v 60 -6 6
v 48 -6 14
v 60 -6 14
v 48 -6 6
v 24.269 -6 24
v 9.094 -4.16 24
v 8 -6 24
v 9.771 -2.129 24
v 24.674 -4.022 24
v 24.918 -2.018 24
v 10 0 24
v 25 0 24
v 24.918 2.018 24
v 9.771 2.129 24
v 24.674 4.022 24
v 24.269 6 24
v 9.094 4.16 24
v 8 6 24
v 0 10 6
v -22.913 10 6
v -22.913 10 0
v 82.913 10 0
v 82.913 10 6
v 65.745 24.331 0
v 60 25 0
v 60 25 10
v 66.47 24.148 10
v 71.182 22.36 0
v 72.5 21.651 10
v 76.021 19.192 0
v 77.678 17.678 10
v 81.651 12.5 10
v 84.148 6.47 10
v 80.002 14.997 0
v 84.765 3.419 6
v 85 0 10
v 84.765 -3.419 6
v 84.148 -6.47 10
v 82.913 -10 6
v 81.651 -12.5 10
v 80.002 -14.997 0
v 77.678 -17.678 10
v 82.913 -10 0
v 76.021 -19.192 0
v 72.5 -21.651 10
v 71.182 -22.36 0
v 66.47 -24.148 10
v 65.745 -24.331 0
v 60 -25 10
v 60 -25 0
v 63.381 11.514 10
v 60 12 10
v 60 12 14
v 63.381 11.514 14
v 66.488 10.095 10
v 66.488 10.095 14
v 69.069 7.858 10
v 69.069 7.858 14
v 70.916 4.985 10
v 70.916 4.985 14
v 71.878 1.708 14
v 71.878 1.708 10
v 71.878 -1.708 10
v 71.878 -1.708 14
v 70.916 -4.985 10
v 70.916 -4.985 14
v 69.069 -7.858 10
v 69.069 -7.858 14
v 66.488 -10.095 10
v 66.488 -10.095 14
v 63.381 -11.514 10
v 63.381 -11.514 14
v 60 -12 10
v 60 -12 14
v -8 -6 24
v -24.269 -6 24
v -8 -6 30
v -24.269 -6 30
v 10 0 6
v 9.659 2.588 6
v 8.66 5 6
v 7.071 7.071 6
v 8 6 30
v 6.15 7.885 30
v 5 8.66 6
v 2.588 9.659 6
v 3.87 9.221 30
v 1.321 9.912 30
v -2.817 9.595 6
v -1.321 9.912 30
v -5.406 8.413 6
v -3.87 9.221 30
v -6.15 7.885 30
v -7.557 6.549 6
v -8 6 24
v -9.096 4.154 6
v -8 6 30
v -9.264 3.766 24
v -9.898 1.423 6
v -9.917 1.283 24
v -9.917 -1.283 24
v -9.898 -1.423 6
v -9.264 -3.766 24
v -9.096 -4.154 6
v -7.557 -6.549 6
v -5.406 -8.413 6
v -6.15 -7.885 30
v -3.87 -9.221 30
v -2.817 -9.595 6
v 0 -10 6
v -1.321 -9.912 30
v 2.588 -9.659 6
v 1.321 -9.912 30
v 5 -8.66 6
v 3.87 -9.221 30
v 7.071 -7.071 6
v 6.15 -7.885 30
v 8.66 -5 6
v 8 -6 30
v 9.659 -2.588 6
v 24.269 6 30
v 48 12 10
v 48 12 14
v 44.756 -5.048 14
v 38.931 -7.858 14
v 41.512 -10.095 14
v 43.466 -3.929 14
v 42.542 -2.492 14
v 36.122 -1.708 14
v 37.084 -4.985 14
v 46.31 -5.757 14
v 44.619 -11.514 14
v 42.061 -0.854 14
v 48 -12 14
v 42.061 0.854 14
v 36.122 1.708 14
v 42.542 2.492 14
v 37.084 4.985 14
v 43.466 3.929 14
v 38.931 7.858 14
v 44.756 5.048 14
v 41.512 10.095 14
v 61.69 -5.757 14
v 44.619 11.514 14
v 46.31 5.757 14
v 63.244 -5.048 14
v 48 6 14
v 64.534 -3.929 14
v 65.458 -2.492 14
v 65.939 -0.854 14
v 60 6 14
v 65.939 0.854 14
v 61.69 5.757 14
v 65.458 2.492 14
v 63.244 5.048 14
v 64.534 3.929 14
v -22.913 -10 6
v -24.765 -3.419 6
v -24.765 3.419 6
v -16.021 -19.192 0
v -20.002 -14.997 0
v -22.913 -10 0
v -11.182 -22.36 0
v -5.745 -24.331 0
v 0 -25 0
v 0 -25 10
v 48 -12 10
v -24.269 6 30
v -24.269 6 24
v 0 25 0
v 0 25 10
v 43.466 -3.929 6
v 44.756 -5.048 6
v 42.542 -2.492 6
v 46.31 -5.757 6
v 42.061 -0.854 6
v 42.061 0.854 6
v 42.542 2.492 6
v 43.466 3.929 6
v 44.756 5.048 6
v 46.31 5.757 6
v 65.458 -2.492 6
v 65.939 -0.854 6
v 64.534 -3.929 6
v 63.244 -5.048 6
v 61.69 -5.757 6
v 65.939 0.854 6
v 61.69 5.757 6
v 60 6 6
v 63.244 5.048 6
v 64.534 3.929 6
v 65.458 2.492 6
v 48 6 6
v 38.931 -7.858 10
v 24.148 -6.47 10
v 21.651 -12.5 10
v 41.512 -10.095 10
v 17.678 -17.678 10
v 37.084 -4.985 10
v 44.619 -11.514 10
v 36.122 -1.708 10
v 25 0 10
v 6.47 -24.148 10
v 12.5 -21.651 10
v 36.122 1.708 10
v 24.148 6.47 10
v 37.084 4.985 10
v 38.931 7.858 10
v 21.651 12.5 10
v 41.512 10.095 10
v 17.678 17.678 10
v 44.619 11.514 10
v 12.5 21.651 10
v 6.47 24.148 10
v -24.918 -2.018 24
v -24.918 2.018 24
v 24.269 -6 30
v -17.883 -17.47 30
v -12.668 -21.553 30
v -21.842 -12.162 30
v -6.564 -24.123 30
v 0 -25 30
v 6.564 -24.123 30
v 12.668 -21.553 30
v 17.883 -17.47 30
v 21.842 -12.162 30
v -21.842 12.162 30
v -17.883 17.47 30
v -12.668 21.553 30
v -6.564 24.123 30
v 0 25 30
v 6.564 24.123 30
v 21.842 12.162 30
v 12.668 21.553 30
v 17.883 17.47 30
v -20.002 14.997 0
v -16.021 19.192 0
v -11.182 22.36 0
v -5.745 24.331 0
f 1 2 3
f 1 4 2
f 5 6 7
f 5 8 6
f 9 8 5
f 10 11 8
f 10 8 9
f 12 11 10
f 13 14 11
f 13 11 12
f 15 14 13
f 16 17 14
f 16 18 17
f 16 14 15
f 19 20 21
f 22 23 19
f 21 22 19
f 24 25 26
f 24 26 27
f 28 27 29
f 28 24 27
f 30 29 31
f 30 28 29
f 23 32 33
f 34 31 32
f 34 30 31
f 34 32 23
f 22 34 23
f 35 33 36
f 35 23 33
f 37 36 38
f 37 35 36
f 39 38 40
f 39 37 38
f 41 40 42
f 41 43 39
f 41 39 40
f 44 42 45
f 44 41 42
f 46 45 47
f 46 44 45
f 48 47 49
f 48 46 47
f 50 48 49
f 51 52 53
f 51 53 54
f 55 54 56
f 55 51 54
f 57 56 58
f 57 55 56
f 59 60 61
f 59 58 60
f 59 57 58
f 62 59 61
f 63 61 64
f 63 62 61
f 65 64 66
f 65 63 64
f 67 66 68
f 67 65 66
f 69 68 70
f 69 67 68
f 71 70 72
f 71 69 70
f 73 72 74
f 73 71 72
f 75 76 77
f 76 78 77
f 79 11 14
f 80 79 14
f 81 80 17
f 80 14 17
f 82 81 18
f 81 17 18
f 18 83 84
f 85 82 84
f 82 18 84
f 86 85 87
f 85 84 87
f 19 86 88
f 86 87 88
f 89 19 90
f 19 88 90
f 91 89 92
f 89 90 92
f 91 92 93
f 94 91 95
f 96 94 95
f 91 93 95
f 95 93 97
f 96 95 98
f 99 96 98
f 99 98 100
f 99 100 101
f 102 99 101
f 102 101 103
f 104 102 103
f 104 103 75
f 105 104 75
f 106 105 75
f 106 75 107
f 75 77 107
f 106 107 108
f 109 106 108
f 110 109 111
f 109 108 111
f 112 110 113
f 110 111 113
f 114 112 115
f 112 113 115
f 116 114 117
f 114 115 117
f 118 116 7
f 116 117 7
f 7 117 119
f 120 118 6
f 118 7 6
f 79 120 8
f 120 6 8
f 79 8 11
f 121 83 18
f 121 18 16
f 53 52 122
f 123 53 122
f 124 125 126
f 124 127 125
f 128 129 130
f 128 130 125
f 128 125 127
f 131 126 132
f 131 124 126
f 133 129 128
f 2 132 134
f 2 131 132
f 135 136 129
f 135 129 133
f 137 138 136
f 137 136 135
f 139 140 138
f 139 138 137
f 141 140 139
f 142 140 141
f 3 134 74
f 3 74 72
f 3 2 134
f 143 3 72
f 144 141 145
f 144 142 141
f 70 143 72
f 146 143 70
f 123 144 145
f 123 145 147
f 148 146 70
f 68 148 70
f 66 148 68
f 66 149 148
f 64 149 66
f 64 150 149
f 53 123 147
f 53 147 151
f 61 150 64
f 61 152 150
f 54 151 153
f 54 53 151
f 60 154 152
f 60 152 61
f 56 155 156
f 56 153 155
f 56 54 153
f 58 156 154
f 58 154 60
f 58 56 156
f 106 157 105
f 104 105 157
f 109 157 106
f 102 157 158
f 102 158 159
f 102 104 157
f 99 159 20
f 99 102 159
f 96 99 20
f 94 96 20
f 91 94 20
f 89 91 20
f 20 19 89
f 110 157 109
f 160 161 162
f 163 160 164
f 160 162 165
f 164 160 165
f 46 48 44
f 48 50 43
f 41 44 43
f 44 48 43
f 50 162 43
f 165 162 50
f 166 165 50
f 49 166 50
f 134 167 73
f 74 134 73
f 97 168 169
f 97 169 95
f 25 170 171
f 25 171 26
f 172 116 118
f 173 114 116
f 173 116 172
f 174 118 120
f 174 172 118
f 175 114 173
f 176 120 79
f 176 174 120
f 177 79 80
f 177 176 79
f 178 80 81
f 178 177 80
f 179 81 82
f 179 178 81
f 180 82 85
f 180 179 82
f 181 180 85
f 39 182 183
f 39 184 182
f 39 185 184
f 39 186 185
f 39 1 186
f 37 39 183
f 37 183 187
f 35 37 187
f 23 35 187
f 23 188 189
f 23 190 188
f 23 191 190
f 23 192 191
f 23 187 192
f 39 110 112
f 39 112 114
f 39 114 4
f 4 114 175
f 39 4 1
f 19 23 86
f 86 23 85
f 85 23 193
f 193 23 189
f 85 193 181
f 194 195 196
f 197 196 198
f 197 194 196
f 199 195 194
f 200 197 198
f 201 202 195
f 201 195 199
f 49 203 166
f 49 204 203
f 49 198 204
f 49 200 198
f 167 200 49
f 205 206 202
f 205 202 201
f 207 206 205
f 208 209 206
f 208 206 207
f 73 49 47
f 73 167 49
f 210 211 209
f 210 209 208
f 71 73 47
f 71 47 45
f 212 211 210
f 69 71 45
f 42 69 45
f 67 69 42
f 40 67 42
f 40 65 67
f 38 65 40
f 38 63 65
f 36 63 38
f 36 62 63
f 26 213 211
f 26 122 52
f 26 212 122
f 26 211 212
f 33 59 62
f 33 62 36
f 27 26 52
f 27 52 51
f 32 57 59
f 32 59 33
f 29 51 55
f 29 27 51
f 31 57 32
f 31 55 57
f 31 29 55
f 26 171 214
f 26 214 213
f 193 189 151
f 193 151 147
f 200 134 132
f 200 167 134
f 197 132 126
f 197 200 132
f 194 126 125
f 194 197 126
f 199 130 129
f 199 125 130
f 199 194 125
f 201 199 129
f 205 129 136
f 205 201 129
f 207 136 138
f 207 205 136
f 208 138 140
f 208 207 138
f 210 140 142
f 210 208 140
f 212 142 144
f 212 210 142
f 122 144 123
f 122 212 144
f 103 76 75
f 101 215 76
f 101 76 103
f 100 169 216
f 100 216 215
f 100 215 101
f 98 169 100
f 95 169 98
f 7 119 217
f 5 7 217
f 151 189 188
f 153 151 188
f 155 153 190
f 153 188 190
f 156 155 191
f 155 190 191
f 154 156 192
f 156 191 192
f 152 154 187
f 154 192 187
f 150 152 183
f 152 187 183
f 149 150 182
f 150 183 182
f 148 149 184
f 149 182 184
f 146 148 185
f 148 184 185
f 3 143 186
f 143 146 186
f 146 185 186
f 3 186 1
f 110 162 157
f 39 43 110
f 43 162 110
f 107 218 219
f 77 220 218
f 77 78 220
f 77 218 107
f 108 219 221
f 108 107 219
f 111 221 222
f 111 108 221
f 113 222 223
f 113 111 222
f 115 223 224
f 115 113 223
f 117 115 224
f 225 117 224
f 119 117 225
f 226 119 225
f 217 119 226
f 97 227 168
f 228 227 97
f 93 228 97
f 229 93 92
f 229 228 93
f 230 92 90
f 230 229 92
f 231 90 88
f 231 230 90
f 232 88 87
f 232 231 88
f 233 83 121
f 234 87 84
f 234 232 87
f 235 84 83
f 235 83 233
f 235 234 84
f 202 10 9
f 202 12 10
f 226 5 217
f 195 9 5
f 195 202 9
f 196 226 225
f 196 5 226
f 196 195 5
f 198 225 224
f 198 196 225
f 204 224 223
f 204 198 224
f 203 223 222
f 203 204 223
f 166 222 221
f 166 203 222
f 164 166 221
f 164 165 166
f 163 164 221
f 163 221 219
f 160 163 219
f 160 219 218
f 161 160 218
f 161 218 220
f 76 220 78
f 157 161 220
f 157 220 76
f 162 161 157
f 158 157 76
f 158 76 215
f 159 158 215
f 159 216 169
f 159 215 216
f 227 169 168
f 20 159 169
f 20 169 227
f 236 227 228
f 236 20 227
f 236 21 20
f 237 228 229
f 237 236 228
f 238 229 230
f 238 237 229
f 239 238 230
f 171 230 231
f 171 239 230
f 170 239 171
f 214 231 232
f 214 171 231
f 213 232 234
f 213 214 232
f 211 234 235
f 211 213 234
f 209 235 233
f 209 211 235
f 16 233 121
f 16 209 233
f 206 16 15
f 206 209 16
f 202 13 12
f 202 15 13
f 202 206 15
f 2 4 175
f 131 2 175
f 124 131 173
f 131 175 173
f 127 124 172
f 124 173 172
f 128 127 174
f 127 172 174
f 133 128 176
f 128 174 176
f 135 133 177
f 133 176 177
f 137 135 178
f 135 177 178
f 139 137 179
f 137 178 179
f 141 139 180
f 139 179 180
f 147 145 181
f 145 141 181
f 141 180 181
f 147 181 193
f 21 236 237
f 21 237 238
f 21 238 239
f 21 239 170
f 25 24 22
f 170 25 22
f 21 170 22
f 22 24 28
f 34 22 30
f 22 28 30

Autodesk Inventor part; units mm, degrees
ref_plane "XZ Plane" through (0, 0, 0) normal (0, 1, 0) x (-1, 0, 0)
ref_plane "XY Plane" through (0, 0, 0) normal (0, 0, 1) x (1, 0, 0)
sketch "Skizze1" plane through (0, 0, 0) normal (0, 0, 1) x (1, 0, 0)
  line L0 (0, 25) -> (60, 25)
  line L1 (0, -25) -> (60, -25)
  circle A0 centre (0, 0) radius 25
  arc A1 (60, -25) -> (60, 25) centre (60, 0) ccw
  line L2 (0, 0) -> (60, 0) construction
  point P0 (0, 0)
  dimension "d1" = 25
  dimension "d2" = 50
  dimension "d3" = 60
extrude "Extrusion1" add sketch "Skizze1" along normal blind 10 contours L0 A1 L1 A0
extrude "Extrusion2" add sketch "Skizze1" along normal blind 30 contours A0
sketch "Skizze3" plane through (0, 0, 30) normal (0, 0, 1) x (1, 0, 0)
  circle A0 centre (0, 0) radius 25 projected
  line L0 (-24.2693, 6) -> (24.2693, 6)
  line L1 (-24.2693, -6) -> (24.2693, -6)
  line L2 (-25, 0) -> (25, 0) construction
  point P0 (0, 0)
  point P1 (0, 0)
  dimension "d11" = 12
extrude "Extrusion4" cut sketch "Skizze3" against normal blind 6 contours A0 L1 L0
sketch "Skizze4" plane through (0, 0, 30) normal (0, 0, 1) x (1, 0, 0)
  circle A0 centre (0, 0) radius 10
  dimension "d14" = 20
extrude "Extrusion5" cut sketch "Skizze4" against normal up to surface (30 mm away)
sketch "Skizze5" plane through (0, 0, 10) normal (0, 0, 1) x (1, 0, 0)
  line L0 (48, 0) -> (60, 0) construction
  line L1 (48, -6) -> (60, -6)
  line L2 (60, 6) -> (48, 6)
  arc A0 (48, 6) -> (48, -6) centre (48, 0) ccw
  arc A1 (60, -6) -> (60, 6) centre (60, 0) ccw
  line L3 (48, 0) -> (60, 0) construction
  line L4 (48, -12) -> (60, -12)
  line L5 (60, 12) -> (48, 12)
  arc A2 (48, 12) -> (48, -12) centre (48, 0) ccw
  arc A3 (60, -12) -> (60, 12) centre (60, 0) ccw
  point P0 (0, 0)
  point P1 (54, 0)
  point P2 (54, 0)
  dimension "d17" = 12
  dimension "d18" = 60
  dimension "d19" = 6
  dimension "d20" = 12
extrude "Extrusion6" cut sketch "Skizze5" against normal up to surface (10 mm away) contours A0 L2 A1 L1
extrude "Extrusion7" add sketch "Skizze5" along normal blind 4
ref_plane "Arbeitsebene2" through (85, 0, 0) normal (1, 0, 0) x (0, 1, 0)
sketch "Skizze6" plane through (85, 0, 0) normal (1, 0, 0) x (0, 1, 0)
  line L0 (25, 0) -> (-25, 0) projected
  line L1 (-10, 0) -> (-10, 6)
  line L2 (-10, 6) -> (10, 6)
  line L3 (10, 6) -> (10, -0.2109)
  line L4 (0, 0) -> (0, 8.6058) construction
  line L5 (25, 10) -> (-25, 10) projected
  point P0 (0, 6)
  point P1 (0, 10)
  point P2 (10, 0)
  dimension "d26" = 20
  dimension "d27" = 4
extrude "Extrusion8" cut sketch "Skizze6" against normal through all
properties part number "slider" material "Stahl, galvanisiert"
